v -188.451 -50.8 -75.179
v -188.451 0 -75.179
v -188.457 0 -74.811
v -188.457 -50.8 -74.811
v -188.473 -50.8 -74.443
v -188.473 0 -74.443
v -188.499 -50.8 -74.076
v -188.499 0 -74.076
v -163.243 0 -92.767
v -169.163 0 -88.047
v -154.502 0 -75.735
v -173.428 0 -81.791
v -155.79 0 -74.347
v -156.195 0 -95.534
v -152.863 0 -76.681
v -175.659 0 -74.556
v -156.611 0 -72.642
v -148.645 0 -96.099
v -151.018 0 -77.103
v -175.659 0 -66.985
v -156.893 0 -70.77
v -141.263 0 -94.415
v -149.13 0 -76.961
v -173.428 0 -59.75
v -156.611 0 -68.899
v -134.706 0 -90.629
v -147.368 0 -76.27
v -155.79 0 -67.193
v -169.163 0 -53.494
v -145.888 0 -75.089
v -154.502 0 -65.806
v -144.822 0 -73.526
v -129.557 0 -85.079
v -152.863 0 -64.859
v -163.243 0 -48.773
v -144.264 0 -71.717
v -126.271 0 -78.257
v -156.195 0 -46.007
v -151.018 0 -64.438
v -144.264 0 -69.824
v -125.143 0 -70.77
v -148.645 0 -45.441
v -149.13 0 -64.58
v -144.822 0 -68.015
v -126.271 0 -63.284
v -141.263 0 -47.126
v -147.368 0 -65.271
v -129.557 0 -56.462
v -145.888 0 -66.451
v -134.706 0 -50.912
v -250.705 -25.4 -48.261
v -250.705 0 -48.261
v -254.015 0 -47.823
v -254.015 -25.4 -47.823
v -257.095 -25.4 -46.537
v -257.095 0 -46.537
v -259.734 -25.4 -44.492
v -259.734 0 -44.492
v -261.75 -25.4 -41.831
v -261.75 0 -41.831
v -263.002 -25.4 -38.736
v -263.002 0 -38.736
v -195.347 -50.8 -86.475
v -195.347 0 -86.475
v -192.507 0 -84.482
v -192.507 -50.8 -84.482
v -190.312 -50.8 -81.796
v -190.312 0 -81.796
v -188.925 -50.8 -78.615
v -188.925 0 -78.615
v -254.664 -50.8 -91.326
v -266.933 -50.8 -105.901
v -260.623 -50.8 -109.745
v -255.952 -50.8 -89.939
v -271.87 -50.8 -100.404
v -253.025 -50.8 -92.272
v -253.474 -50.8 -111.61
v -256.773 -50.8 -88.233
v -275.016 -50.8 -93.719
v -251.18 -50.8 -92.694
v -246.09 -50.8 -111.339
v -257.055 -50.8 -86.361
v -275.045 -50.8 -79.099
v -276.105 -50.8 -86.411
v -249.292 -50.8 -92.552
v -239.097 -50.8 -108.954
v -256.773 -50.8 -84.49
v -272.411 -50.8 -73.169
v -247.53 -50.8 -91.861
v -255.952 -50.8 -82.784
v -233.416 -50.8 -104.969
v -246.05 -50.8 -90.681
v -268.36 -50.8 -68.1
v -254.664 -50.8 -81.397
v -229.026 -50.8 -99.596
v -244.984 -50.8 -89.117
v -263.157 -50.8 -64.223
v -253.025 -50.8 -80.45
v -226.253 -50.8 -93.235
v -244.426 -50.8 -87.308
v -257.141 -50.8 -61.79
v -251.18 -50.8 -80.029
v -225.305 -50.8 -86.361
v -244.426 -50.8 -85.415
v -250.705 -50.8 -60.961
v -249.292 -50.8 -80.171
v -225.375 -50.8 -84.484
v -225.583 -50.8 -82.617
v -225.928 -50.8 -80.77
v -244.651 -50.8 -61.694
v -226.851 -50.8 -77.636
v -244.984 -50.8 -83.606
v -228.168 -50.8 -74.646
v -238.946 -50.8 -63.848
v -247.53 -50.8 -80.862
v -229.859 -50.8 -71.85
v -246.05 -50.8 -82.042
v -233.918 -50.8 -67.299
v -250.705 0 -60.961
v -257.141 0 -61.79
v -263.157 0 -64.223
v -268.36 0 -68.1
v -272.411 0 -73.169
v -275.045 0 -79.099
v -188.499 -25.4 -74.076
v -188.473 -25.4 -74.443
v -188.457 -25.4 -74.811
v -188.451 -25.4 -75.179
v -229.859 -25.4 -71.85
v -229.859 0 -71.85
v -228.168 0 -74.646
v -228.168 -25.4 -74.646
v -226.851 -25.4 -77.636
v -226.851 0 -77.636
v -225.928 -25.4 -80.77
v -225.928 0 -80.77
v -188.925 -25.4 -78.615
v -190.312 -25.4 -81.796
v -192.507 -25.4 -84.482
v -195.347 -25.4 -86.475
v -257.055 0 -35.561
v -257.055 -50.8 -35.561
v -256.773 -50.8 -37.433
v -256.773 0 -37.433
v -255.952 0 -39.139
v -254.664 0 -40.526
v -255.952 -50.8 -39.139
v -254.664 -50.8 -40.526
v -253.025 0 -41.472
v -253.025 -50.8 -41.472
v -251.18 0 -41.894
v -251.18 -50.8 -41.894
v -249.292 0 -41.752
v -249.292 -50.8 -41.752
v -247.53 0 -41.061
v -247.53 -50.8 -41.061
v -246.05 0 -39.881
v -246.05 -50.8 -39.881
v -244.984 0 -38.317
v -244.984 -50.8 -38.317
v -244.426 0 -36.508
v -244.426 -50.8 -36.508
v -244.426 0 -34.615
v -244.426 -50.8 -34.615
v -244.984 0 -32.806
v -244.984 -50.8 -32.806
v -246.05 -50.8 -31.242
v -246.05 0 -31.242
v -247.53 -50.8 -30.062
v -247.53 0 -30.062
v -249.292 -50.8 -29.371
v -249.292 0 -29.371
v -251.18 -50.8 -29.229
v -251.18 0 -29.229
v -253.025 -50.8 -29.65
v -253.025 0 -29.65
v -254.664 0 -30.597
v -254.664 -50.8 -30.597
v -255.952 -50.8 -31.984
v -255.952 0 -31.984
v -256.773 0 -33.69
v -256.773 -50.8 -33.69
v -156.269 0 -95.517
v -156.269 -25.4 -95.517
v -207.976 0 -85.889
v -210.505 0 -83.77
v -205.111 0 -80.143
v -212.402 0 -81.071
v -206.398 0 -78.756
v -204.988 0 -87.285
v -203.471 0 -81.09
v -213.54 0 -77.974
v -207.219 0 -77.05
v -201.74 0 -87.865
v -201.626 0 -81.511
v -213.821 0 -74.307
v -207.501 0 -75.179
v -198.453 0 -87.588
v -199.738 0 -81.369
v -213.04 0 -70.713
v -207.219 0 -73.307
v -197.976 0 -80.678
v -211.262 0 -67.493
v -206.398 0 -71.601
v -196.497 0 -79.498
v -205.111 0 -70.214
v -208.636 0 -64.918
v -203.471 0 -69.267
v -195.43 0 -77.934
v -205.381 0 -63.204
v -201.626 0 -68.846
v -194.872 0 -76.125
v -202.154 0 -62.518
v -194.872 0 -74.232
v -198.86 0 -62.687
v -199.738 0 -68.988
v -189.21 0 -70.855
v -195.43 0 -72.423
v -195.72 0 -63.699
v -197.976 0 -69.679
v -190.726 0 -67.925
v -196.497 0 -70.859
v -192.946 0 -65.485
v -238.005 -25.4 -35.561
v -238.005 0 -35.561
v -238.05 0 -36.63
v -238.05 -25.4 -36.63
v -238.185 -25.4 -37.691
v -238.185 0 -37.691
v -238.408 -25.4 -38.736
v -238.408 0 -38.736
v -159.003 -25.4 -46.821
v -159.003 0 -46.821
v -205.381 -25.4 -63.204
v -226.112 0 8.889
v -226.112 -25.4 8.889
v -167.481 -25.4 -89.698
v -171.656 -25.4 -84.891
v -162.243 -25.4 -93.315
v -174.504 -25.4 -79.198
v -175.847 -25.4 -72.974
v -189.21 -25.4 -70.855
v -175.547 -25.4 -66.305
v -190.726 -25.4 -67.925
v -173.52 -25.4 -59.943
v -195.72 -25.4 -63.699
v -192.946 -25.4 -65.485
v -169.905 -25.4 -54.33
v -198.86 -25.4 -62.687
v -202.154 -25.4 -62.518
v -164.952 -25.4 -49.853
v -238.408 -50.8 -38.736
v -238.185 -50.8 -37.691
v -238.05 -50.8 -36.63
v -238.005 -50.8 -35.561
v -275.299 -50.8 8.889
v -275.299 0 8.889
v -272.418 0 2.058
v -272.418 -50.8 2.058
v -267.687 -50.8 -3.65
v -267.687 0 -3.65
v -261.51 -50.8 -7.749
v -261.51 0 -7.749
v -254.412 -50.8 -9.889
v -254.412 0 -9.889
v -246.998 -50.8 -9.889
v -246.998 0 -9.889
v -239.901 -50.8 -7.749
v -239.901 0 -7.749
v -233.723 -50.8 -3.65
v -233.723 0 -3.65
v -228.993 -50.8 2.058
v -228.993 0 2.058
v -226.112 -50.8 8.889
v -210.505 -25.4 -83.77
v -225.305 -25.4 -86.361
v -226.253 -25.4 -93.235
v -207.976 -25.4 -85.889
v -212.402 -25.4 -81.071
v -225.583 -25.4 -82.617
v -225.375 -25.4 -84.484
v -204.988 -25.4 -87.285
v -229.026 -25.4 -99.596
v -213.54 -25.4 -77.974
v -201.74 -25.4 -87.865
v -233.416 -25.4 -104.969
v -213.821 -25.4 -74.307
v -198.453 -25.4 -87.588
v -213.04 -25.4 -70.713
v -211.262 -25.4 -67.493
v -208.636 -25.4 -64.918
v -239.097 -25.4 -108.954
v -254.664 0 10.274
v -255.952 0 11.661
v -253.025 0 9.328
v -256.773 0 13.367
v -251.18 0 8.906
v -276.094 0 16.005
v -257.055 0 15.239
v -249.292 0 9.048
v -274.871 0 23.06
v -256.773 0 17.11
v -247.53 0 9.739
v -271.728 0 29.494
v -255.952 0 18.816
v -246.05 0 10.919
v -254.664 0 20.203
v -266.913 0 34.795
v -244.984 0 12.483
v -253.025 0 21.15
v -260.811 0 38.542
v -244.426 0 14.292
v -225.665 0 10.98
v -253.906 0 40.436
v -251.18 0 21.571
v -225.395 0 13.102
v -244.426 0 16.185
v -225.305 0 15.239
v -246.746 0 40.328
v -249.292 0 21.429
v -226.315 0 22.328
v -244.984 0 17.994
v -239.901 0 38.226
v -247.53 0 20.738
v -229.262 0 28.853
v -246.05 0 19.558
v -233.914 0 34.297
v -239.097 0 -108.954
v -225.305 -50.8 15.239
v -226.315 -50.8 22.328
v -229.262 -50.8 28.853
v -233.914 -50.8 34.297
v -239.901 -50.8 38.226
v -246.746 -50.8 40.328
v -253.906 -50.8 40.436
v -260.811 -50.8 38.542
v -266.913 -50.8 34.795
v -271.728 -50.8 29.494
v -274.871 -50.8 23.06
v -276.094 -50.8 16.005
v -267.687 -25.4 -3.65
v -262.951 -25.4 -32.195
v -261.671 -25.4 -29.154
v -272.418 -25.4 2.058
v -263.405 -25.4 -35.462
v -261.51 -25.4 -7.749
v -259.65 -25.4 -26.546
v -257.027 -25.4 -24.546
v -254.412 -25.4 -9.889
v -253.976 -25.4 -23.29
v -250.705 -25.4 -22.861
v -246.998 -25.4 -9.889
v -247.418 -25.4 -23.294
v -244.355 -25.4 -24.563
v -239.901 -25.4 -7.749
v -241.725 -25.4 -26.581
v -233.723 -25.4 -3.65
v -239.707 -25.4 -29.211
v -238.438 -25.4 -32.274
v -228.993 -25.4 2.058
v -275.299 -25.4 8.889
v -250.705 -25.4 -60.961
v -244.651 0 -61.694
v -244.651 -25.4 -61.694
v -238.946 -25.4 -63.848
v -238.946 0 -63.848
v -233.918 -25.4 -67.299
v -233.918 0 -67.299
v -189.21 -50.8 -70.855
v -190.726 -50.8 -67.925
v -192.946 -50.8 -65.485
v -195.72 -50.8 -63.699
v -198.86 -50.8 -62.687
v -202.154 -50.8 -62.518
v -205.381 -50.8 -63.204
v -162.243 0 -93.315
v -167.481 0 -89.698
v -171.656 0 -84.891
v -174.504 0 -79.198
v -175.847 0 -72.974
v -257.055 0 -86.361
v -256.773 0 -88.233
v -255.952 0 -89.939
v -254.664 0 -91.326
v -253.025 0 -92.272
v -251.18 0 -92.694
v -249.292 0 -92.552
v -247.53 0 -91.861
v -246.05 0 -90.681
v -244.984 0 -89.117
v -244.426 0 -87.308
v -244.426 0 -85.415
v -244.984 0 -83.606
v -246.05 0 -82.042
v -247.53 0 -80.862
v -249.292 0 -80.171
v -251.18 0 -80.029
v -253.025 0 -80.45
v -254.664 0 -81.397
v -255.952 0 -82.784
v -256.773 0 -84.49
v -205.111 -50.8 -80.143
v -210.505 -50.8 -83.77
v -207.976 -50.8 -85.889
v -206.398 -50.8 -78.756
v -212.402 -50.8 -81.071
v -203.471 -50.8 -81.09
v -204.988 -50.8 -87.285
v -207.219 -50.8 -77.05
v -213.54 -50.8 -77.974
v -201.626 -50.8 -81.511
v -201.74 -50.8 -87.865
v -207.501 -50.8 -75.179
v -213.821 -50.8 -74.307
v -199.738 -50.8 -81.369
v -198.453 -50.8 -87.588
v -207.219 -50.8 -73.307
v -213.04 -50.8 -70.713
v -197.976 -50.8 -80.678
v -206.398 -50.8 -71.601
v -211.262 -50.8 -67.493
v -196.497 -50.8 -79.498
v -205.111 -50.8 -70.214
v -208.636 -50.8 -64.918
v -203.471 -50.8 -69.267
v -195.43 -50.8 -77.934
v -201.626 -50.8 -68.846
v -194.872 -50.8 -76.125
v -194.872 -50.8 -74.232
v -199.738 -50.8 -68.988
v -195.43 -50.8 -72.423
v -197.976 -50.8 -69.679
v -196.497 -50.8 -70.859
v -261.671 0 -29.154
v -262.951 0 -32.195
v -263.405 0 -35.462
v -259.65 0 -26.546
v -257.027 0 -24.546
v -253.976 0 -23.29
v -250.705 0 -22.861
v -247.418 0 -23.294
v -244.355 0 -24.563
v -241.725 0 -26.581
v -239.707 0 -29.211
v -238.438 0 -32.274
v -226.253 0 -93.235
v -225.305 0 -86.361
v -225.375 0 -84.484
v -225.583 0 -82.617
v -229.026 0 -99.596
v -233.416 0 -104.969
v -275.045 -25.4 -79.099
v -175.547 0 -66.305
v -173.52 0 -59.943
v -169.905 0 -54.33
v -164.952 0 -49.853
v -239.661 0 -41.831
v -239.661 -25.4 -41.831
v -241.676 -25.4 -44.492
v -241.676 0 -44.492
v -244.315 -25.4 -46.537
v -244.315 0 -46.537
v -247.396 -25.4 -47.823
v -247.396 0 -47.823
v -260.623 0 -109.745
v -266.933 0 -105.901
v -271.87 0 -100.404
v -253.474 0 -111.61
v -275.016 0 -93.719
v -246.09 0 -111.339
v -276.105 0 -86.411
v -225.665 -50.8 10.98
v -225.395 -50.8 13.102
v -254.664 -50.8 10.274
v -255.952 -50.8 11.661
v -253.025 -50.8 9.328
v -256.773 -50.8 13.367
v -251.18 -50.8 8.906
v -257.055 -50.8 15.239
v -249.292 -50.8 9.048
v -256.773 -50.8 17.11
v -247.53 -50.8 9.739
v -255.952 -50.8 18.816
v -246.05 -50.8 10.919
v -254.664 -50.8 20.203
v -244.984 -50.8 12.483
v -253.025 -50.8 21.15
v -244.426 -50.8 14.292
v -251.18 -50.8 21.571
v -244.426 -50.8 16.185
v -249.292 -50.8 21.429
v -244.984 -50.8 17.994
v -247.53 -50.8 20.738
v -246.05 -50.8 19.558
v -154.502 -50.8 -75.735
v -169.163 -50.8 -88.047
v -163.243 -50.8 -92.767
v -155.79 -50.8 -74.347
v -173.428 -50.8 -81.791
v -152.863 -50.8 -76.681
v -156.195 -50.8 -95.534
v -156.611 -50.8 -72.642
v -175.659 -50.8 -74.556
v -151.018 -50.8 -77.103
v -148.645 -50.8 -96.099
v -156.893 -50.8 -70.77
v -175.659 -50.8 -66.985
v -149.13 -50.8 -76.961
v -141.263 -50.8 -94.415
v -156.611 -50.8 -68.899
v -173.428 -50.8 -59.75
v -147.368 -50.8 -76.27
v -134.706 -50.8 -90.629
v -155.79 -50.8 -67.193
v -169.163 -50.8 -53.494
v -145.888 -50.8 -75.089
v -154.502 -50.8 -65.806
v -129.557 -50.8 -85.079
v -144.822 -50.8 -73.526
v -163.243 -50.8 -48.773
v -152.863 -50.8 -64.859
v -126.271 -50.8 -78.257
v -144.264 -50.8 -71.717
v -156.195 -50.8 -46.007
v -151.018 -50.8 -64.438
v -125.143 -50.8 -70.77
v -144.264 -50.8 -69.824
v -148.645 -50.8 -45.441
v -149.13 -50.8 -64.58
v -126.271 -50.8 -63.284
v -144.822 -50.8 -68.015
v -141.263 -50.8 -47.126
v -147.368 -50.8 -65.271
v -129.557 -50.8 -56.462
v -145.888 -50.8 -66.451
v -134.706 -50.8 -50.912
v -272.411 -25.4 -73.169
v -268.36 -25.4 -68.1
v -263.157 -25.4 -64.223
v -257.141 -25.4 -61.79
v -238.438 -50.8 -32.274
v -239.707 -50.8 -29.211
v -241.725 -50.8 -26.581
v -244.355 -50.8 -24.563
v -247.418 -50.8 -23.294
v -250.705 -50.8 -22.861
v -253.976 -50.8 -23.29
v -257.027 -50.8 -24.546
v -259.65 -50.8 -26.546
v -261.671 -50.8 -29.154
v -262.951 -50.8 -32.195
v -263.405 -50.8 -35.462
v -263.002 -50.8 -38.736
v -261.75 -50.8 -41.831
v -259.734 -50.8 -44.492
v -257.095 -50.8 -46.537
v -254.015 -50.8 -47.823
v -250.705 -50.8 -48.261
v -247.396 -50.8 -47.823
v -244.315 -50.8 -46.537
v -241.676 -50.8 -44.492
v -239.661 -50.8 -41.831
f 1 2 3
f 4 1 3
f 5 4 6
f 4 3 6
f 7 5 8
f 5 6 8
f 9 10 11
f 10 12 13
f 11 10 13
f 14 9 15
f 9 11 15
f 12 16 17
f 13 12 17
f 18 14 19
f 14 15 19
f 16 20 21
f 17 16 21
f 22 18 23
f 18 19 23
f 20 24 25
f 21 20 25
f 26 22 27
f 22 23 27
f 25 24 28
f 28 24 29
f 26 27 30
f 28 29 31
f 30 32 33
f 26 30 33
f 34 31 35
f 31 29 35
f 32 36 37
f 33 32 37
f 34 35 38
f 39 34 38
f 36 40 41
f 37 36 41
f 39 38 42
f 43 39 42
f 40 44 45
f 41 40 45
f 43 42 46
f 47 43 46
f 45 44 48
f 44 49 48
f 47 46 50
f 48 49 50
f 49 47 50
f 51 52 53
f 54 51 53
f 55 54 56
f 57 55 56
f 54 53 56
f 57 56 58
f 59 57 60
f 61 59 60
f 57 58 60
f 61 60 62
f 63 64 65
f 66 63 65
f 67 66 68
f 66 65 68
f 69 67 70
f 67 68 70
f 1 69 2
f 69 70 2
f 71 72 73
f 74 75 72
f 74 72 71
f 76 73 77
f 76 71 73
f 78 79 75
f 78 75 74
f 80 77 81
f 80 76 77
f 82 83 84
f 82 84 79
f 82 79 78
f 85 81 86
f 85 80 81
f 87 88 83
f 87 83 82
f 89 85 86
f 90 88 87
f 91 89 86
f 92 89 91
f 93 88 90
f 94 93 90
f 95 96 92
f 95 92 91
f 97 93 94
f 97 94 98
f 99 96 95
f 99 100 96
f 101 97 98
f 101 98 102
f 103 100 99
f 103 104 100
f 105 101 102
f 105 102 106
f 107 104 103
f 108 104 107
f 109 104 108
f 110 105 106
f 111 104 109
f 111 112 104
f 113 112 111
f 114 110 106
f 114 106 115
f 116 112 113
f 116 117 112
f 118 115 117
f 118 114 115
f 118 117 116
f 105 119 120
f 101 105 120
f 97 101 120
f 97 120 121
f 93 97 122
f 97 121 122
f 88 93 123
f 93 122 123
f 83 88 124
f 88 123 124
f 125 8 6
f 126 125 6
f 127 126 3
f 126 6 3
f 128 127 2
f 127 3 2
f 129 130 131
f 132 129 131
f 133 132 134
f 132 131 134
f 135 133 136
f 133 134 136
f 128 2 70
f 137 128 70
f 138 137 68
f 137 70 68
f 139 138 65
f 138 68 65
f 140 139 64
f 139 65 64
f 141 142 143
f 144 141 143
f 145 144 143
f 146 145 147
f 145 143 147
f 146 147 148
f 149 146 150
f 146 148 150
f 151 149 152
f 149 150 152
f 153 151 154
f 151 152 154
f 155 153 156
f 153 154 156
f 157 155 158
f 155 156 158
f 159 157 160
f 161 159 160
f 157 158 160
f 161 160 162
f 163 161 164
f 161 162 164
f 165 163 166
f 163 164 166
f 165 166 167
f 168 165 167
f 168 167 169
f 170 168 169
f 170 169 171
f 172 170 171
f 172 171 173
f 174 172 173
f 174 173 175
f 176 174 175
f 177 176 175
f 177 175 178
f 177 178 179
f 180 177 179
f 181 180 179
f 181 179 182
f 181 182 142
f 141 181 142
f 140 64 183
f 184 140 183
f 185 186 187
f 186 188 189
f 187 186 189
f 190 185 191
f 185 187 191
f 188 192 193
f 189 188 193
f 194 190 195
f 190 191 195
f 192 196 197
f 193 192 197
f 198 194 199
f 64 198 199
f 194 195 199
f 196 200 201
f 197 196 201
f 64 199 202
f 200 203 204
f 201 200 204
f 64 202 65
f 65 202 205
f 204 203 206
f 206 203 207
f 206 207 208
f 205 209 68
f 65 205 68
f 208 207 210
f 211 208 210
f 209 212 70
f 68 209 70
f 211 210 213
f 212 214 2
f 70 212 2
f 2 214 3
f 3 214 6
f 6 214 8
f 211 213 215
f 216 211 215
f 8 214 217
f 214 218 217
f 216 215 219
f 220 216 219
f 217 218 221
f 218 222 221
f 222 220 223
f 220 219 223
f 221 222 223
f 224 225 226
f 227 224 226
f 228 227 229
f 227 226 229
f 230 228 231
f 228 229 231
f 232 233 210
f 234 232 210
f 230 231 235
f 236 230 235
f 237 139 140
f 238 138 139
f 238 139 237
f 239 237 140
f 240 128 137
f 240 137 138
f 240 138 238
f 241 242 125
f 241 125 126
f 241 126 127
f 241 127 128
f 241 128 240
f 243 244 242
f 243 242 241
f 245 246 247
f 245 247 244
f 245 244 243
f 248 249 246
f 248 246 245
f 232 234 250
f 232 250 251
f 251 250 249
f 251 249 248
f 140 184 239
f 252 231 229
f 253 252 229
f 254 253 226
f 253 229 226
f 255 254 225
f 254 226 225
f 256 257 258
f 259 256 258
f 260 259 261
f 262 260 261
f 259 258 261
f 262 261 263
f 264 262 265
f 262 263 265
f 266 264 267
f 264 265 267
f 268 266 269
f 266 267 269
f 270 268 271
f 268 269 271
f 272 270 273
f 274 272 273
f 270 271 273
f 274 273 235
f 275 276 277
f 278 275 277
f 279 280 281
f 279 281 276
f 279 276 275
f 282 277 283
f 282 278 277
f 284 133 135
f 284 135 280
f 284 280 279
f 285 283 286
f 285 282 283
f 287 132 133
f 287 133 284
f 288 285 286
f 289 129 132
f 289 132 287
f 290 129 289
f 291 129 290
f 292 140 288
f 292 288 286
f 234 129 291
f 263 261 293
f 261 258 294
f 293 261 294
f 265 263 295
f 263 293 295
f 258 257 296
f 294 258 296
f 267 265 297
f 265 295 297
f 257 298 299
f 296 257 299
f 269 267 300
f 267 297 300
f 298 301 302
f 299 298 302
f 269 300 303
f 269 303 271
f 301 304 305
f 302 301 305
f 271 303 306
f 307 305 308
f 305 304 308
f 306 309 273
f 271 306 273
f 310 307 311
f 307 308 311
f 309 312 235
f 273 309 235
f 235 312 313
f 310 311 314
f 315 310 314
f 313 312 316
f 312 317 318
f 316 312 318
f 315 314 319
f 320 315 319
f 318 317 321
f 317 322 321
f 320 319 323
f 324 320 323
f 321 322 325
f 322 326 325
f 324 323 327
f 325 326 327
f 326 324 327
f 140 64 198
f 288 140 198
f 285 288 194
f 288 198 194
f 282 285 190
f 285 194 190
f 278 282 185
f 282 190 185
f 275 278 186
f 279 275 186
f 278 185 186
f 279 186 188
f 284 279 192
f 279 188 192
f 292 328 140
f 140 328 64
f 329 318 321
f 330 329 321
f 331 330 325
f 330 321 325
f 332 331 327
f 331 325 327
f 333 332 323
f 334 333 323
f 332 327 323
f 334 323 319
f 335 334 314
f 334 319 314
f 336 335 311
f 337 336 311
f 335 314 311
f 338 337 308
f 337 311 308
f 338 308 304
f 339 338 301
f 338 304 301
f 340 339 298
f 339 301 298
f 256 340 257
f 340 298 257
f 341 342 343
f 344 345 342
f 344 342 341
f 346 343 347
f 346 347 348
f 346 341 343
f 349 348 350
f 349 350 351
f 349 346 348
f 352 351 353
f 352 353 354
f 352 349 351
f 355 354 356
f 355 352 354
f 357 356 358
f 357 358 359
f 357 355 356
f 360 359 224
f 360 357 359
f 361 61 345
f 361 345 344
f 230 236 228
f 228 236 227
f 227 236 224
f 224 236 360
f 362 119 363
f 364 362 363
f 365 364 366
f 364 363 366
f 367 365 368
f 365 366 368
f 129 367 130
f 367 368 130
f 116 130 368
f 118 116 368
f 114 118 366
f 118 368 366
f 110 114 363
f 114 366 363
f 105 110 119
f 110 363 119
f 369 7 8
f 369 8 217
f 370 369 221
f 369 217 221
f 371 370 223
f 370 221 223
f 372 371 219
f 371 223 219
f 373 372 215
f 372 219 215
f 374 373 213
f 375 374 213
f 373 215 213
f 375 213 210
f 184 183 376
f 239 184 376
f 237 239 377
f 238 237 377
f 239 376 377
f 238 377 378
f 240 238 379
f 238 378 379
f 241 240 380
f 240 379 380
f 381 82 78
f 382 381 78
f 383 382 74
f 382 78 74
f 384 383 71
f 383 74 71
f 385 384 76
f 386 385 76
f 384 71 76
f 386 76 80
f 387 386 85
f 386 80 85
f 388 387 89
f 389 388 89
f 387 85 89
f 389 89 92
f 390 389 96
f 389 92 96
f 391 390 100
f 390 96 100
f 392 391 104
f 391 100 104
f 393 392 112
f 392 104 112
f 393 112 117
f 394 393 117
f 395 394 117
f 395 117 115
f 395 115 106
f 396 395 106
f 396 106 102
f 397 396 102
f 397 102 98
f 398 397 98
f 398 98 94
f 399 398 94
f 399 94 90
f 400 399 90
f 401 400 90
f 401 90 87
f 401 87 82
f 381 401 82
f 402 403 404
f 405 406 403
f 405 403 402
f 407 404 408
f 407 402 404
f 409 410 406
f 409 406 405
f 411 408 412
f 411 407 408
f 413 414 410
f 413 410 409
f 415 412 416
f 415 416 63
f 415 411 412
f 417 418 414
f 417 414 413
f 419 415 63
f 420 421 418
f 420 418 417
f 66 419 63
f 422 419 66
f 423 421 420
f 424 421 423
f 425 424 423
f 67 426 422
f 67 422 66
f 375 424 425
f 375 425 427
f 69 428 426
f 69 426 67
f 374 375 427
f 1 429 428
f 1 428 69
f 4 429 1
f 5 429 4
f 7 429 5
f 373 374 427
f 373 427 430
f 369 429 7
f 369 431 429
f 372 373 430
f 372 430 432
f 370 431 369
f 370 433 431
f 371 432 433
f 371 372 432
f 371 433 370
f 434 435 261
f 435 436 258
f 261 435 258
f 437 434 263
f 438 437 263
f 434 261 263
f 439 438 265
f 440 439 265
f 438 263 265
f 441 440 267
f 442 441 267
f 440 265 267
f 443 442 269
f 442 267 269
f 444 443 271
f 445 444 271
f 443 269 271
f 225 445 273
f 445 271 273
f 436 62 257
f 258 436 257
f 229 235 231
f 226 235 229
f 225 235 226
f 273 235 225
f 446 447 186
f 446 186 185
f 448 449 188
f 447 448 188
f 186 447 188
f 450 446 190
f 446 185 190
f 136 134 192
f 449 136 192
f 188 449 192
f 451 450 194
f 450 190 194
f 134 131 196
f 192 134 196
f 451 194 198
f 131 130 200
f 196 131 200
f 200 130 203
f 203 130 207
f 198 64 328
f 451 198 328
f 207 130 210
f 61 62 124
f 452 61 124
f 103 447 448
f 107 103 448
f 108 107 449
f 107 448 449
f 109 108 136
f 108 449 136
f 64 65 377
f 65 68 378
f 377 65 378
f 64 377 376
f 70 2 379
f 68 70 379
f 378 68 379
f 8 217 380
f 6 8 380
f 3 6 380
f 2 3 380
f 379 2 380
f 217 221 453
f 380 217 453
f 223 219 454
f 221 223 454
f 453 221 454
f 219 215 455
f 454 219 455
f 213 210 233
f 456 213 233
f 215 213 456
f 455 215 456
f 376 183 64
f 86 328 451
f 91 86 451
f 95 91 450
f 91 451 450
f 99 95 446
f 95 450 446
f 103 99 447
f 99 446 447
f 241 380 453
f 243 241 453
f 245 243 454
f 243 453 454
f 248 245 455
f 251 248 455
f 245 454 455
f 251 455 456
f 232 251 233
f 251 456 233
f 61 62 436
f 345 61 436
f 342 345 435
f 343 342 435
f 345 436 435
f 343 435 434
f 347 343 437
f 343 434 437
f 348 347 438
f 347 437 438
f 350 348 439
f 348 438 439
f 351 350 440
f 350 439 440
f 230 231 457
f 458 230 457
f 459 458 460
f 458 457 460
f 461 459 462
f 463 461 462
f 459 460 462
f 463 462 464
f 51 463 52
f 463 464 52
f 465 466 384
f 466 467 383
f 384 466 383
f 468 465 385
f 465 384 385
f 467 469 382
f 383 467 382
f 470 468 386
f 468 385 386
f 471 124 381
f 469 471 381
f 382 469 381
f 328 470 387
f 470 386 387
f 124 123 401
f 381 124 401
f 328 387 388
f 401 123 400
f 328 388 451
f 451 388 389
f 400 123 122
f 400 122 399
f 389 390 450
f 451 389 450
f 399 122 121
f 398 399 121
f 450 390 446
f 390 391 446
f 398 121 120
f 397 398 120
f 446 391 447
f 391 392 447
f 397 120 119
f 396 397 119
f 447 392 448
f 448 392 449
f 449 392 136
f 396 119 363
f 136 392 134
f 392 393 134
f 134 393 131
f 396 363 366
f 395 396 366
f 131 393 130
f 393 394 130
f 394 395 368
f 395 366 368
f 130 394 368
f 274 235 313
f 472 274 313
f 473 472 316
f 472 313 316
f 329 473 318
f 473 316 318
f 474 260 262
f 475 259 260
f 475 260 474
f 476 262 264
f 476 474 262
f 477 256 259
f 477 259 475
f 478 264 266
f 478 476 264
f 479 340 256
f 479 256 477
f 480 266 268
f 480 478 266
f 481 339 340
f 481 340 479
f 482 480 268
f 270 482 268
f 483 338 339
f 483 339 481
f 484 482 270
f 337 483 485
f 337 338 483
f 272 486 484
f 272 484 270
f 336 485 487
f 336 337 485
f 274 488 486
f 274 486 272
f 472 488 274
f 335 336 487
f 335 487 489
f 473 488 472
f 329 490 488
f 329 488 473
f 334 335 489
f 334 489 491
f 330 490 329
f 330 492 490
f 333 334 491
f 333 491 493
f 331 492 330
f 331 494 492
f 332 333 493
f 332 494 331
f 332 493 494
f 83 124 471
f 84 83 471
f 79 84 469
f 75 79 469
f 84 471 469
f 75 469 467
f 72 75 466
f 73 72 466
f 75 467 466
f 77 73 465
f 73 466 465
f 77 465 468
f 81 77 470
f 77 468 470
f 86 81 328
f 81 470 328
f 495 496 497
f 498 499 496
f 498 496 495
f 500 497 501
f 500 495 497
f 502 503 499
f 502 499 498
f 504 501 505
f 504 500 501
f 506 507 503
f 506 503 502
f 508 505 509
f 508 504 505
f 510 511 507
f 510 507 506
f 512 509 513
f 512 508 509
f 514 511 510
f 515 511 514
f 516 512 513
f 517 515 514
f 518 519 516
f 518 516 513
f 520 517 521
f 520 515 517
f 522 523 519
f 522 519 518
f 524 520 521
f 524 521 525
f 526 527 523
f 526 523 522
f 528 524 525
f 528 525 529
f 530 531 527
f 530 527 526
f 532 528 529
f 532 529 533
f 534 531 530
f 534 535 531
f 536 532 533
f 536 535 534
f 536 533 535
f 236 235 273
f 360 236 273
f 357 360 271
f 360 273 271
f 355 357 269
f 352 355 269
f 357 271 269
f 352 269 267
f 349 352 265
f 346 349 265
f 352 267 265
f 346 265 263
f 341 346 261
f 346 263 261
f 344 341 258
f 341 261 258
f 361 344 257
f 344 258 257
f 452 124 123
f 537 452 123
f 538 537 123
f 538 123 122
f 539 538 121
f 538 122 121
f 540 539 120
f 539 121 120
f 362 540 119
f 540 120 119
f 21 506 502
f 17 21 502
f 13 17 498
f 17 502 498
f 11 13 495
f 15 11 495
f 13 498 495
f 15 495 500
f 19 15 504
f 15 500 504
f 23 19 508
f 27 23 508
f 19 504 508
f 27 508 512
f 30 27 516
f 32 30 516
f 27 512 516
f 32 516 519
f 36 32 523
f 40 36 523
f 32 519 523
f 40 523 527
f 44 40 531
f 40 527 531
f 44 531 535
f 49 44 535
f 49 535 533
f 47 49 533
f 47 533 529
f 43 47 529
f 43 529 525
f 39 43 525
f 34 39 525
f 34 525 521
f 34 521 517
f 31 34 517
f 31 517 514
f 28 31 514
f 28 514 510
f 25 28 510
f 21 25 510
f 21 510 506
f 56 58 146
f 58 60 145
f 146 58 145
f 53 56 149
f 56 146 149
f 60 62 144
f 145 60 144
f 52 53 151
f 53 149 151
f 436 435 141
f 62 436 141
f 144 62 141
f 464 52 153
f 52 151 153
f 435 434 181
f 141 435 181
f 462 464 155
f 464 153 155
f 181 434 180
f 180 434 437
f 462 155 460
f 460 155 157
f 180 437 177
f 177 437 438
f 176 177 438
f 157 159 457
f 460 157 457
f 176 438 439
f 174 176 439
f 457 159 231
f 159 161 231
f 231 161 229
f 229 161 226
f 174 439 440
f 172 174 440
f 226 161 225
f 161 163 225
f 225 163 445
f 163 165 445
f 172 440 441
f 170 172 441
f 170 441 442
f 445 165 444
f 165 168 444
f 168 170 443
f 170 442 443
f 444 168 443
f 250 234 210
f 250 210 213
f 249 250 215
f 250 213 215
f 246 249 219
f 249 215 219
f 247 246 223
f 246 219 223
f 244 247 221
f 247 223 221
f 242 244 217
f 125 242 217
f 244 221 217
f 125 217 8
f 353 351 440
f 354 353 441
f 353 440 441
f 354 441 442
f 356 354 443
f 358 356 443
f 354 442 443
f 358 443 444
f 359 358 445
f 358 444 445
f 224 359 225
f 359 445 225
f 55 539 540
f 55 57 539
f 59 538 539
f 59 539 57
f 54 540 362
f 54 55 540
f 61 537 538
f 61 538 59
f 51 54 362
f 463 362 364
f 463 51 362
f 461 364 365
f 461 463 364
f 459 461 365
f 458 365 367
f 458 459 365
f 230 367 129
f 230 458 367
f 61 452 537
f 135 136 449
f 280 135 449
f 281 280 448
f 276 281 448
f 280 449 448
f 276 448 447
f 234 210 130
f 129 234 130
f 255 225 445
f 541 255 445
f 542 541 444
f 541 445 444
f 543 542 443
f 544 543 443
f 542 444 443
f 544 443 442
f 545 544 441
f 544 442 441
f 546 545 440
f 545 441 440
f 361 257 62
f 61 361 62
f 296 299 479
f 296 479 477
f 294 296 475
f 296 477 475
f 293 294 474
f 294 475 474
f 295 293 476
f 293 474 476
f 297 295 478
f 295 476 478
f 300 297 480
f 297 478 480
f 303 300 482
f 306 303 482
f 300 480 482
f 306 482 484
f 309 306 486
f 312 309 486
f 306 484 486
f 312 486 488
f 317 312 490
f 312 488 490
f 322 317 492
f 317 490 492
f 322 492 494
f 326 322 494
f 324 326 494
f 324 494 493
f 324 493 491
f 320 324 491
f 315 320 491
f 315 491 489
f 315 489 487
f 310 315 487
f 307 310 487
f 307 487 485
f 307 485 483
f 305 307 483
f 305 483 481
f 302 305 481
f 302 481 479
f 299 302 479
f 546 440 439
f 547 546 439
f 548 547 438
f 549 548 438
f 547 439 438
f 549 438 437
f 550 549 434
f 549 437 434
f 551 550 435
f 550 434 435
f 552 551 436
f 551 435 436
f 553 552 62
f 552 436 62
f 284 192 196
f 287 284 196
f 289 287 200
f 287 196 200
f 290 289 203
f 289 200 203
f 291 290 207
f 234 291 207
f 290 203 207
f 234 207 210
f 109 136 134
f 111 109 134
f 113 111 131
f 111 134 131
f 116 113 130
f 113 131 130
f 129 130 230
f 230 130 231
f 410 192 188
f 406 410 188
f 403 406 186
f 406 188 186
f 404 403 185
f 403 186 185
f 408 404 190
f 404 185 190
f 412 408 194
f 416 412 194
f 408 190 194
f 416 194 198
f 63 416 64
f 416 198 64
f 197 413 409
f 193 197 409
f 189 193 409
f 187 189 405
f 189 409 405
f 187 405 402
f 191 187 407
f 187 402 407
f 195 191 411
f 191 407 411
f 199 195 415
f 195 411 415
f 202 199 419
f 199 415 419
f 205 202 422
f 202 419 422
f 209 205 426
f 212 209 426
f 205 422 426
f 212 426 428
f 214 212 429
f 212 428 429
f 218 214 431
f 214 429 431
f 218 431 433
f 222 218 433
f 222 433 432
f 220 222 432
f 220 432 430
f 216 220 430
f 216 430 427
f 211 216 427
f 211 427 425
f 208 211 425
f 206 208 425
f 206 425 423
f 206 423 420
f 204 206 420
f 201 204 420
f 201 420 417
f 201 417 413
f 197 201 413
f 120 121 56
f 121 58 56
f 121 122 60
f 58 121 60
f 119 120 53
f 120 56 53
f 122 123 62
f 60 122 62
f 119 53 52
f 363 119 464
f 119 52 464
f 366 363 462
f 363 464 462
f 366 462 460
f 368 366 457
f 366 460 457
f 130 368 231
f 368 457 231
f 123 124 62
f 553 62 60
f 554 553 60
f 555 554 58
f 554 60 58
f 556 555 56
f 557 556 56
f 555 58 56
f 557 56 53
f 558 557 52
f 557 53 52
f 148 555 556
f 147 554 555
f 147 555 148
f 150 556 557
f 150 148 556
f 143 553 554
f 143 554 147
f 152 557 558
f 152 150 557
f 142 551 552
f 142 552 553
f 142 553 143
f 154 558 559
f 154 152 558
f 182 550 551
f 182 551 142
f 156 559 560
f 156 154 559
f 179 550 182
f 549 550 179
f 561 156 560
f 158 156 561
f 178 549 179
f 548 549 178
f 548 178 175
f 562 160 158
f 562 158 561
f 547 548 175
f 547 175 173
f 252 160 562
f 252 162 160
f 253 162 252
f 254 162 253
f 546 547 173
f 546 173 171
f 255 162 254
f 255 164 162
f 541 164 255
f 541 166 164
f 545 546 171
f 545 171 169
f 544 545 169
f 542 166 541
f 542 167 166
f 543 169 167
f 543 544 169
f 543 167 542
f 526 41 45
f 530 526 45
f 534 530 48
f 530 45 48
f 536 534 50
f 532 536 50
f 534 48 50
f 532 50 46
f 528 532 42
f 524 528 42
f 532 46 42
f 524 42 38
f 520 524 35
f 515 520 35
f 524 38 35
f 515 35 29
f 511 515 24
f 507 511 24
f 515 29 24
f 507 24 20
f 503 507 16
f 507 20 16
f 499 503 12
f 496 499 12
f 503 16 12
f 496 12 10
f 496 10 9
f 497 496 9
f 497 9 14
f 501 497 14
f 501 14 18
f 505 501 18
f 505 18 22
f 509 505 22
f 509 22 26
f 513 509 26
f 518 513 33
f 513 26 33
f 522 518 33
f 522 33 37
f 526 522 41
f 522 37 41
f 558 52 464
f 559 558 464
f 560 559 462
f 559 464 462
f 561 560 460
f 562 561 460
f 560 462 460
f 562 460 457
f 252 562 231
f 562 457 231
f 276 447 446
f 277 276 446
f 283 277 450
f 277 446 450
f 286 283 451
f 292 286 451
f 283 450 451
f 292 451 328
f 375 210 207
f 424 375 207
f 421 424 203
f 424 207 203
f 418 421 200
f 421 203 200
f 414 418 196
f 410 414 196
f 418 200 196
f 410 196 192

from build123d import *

# Parameters (mm, degrees)
F1_DEPTH = 50.8
F2_DEPTH = 25.4
F3_D     = 6.35
F3_2_D   = 6.35
F3_3_D   = 6.35
F3_4_D   = 6.35
F3_5_D   = 6.35
F4_D     = 12.7
F4_2_D   = 12.7
F4_3_D   = 12.7
F4_4_D   = 12.7
F4_5_D   = 12.7


with BuildPart() as f1:
    # F0 (on Front) → F1 (new body)
    with BuildSketch(Plane.XZ):
        with BuildLine():
            ThreePointArc((-275.2986628223, 8.8885812562), (-266.2594784405, -4.8418818859), (-250.7052185738, -10.1614187438))
            ThreePointArc((-250.7052185738, -10.1614187438), (-235.1509587072, -4.8418818859), (-226.1117743254, 8.8885812562))
            ThreePointArc((-226.1117743254, 8.8885812562), (-225.5076642886, 12.0380722271), (-225.3052185738, 15.2385812562))
            ThreePointArc((-225.3052185738, 15.2385812562), (-253.9057276029, 40.4361355414), (-275.2986628223, 8.8885812562))
        make_face()
    extrude(amount=F1_DEPTH)

    # F3 (through all)
    with Locations(Plane(origin=(0, 0, 0), x_dir=(1, 0, 0), z_dir=(0, 1, 0))):
        with Locations((-250.7052185738, -15.2385812562), (-250.7052185738, 35.5614187438), (-250.7052185738, 86.3614187438), (-201.151381854, 75.1785181209), (-150.5429993109, 70.7703874091)):
            Hole(F3_D / 2)

    # F4 (through all)
    with Locations(Plane(origin=(0, 0, 0), x_dir=(1, 0, 0), z_dir=(0, 1, 0))):
        with Locations((-250.7052185738, -15.2385812562), (-250.7052185738, 35.5614187438), (-250.7052185738, 86.3614187438), (-201.151381854, 75.1785181209), (-150.5429993109, 70.7703874091)):
            Hole(F4_D / 2)


with BuildPart() as f1b:
    # F0 (on Front) → F1, piece 2 (new body)
    with BuildSketch(Plane.XZ):
        with BuildLine():
            ThreePointArc((-238.0052185738, -35.5614187438), (-241.7249624528, -26.5811626228), (-250.7052185738, -22.8614187438))
            Line((-250.7052185738, -22.8614187438), (-250.7052185738, -35.5614187438))
            Line((-250.7052185738, -35.5614187438), (-250.7052185738, -48.2614187438))
            ThreePointArc((-250.7052185738, -48.2614187438), (-242.9280886405, -45.6016503149), (-238.4084964496, -38.7364187438))
            ThreePointArc((-238.4084964496, -38.7364187438), (-238.1064414312, -37.1616732584), (-238.0052185738, -35.5614187438))
        make_face()
        with BuildLine():
            Line((-250.7052185738, -35.5614187438), (-250.7052185738, -22.8614187438))
            ThreePointArc((-250.7052185738, -22.8614187438), (-260.7454501449, -27.7842888105), (-263.001940698, -38.7364187438))
            ThreePointArc((-263.001940698, -38.7364187438), (-258.4823485072, -45.6016503149), (-250.7052185738, -48.2614187438))
            Line((-250.7052185738, -48.2614187438), (-250.7052185738, -35.5614187438))
        make_face()
    extrude(amount=F1_DEPTH)

    # F3#2 (through all)
    with Locations(Plane(origin=(0, 0, 0), x_dir=(1, 0, 0), z_dir=(0, 1, 0))):
        with Locations((-250.7052185738, -15.2385812562), (-250.7052185738, 35.5614187438), (-250.7052185738, 86.3614187438), (-201.151381854, 75.1785181209), (-150.5429993109, 70.7703874091)):
            Hole(F3_2_D / 2)

    # F4#2 (through all)
    with Locations(Plane(origin=(0, 0, 0), x_dir=(1, 0, 0), z_dir=(0, 1, 0))):
        with Locations((-250.7052185738, -15.2385812562), (-250.7052185738, 35.5614187438), (-250.7052185738, 86.3614187438), (-201.151381854, 75.1785181209), (-150.5429993109, 70.7703874091)):
            Hole(F4_2_D / 2)


with BuildPart() as f1c:
    # F0 (on Front) → F1, piece 3 (new body)
    with BuildSketch(Plane.XZ):
        with BuildLine():
            ThreePointArc((-250.7052185738, -60.9614187438), (-265.8825125384, -65.9945400455), (-275.0449118924, -79.0992338688))
            ThreePointArc((-275.0449118924, -79.0992338688), (-266.9331432174, -105.901491972), (-239.0970904995, -108.9537042105))
            ThreePointArc((-239.0970904995, -108.9537042105), (-229.0256607706, -99.5960994523), (-225.3052185738, -86.3614187438))
            ThreePointArc((-225.3052185738, -86.3614187438), (-225.4614695818, -83.548388913), (-225.9283002139, -80.7699684324))
            Line((-225.9283002139, -80.7699684324), (-250.7052185738, -86.3614187438))
            Line((-250.7052185738, -86.3614187438), (-250.7052185738, -60.9614187438))
        make_face()
        with BuildLine():
            ThreePointArc((-225.9283002139, -80.7699684324), (-227.4615465931, -76.1197532128), (-229.8585710724, -71.850137341))
            ThreePointArc((-229.8585710724, -71.850137341), (-238.945680905, -63.847572475), (-250.7052185738, -60.9614187438))
            Line((-250.7052185738, -60.9614187438), (-250.7052185738, -86.3614187438))
            Line((-250.7052185738, -86.3614187438), (-225.9283002139, -80.7699684324))
        make_face()
    extrude(amount=F1_DEPTH)

    # F3#3 (through all)
    with Locations(Plane(origin=(0, 0, 0), x_dir=(1, 0, 0), z_dir=(0, 1, 0))):
        with Locations((-250.7052185738, -15.2385812562), (-250.7052185738, 35.5614187438), (-250.7052185738, 86.3614187438), (-201.151381854, 75.1785181209), (-150.5429993109, 70.7703874091)):
            Hole(F3_3_D / 2)

    # F4#3 (through all)
    with Locations(Plane(origin=(0, 0, 0), x_dir=(1, 0, 0), z_dir=(0, 1, 0))):
        with Locations((-250.7052185738, -15.2385812562), (-250.7052185738, 35.5614187438), (-250.7052185738, 86.3614187438), (-201.151381854, 75.1785181209), (-150.5429993109, 70.7703874091)):
            Hole(F4_3_D / 2)


with BuildPart() as f1d:
    # F0 (on Front) → F1, piece 4 (new body)
    with BuildSketch(Plane.XZ):
        with BuildLine():
            ThreePointArc((-188.4992862182, -74.076485443), (-194.2748205624, -64.5013038399), (-205.3814443151, -63.2036873674))
            ThreePointArc((-205.3814443151, -63.2036873674), (-212.2683124488, -69.0381717016), (-213.5398410339, -77.9742432766))
            Line((-213.5398410339, -77.9742432766), (-201.151381854, -75.1785181209))
            Line((-201.151381854, -75.1785181209), (-188.4992862182, -74.076485443))
        make_face()
        with BuildLine():
            ThreePointArc((-213.5398410339, -77.9742432766), (-206.5275179755, -86.6844800712), (-195.3473178168, -86.4746608543))
            ThreePointArc((-195.3473178168, -86.4746608543), (-190.3116029524, -81.7958584752), (-188.451381854, -75.1785181209))
            ThreePointArc((-188.451381854, -75.1785181209), (-188.4633635971, -74.6269814378), (-188.4992862182, -74.076485443))
            Line((-188.4992862182, -74.076485443), (-201.151381854, -75.1785181209))
            Line((-201.151381854, -75.1785181209), (-213.5398410339, -77.9742432766))
        make_face()
    extrude(amount=F1_DEPTH)

    # F3#4 (through all)
    with Locations(Plane(origin=(0, 0, 0), x_dir=(1, 0, 0), z_dir=(0, 1, 0))):
        with Locations((-250.7052185738, -15.2385812562), (-250.7052185738, 35.5614187438), (-250.7052185738, 86.3614187438), (-201.151381854, 75.1785181209), (-150.5429993109, 70.7703874091)):
            Hole(F3_4_D / 2)

    # F4#4 (through all)
    with Locations(Plane(origin=(0, 0, 0), x_dir=(1, 0, 0), z_dir=(0, 1, 0))):
        with Locations((-250.7052185738, -15.2385812562), (-250.7052185738, 35.5614187438), (-250.7052185738, 86.3614187438), (-201.151381854, 75.1785181209), (-150.5429993109, 70.7703874091)):
            Hole(F4_4_D / 2)


with BuildPart() as f1e:
    # F0 (on Front) → F1, piece 5 (new body)
    with BuildSketch(Plane.XZ):
        with BuildLine():
            ThreePointArc((-125.1429993109, -70.7703874091), (-135.8754700886, -50.0333773423), (-159.0031242331, -46.8207259021))
            ThreePointArc((-159.0031242331, -46.8207259021), (-171.897427873, -57.017264826), (-175.8471905824, -72.974452765))
            ThreePointArc((-175.8471905824, -72.974452765), (-169.7198507425, -87.4259681306), (-156.268752864, -95.5166143185))
            ThreePointArc((-156.268752864, -95.5166143185), (-134.7359461423, -90.6524665289), (-125.1429993109, -70.7703874091))
        make_face()
    extrude(amount=F1_DEPTH)

    # F3#5 (through all)
    with Locations(Plane(origin=(0, 0, 0), x_dir=(1, 0, 0), z_dir=(0, 1, 0))):
        with Locations((-250.7052185738, -15.2385812562), (-250.7052185738, 35.5614187438), (-250.7052185738, 86.3614187438), (-201.151381854, 75.1785181209), (-150.5429993109, 70.7703874091)):
            Hole(F3_5_D / 2)

    # F4#5 (through all)
    with Locations(Plane(origin=(0, 0, 0), x_dir=(1, 0, 0), z_dir=(0, 1, 0))):
        with Locations((-250.7052185738, -15.2385812562), (-250.7052185738, 35.5614187438), (-250.7052185738, 86.3614187438), (-201.151381854, 75.1785181209), (-150.5429993109, 70.7703874091)):
            Hole(F4_5_D / 2)


with BuildPart() as f2:
    # F0 (on Front) → F2 (new body)
    with BuildSketch(Plane.XZ):
        with BuildLine():
            Line((-250.7052185738, -22.8614187438), (-250.7052185738, -10.1614187438))
            ThreePointArc((-250.7052185738, -10.1614187438), (-266.2594784405, -4.8418818859), (-275.2986628223, 8.8885812562))
            Line((-275.2986628223, 8.8885812562), (-263.001940698, -38.7364187438))
            ThreePointArc((-263.001940698, -38.7364187438), (-260.7454501449, -27.7842888105), (-250.7052185738, -22.8614187438))
        make_face()
        with BuildLine():
            ThreePointArc((-226.1117743254, 8.8885812562), (-235.1509587072, -4.8418818859), (-250.7052185738, -10.1614187438))
            Line((-250.7052185738, -10.1614187438), (-250.7052185738, -22.8614187438))
            ThreePointArc((-250.7052185738, -22.8614187438), (-241.7249624528, -26.5811626228), (-238.0052185738, -35.5614187438))
            ThreePointArc((-238.0052185738, -35.5614187438), (-238.1064414312, -37.1616732584), (-238.4084964496, -38.7364187438))
            Line((-238.4084964496, -38.7364187438), (-226.1117743254, 8.8885812562))
        make_face()
    extrude(amount=F2_DEPTH)


with BuildPart() as f2b:
    # F0 (on Front) → F2, piece 2 (new body)
    with BuildSketch(Plane.XZ):
        with BuildLine():
            Line((-229.8585710724, -71.850137341), (-238.4084964496, -38.7364187438))
            ThreePointArc((-238.4084964496, -38.7364187438), (-242.9280886405, -45.6016503149), (-250.7052185738, -48.2614187438))
            Line((-250.7052185738, -48.2614187438), (-250.7052185738, -60.9614187438))
            ThreePointArc((-250.7052185738, -60.9614187438), (-238.945680905, -63.847572475), (-229.8585710724, -71.850137341))
        make_face()
        with BuildLine():
            ThreePointArc((-250.7052185738, -48.2614187438), (-258.4823485072, -45.6016503149), (-263.001940698, -38.7364187438))
            Line((-263.001940698, -38.7364187438), (-275.0449118924, -79.0992338688))
            ThreePointArc((-275.0449118924, -79.0992338688), (-265.8825125384, -65.9945400455), (-250.7052185738, -60.9614187438))
            Line((-250.7052185738, -60.9614187438), (-250.7052185738, -48.2614187438))
        make_face()
    extrude(amount=F2_DEPTH)


with BuildPart() as f2c:
    # F0 (on Front) → F2, piece 3 (new body)
    with BuildSketch(Plane.XZ):
        with BuildLine():
            Line((-159.0031242331, -46.8207259021), (-205.3814443151, -63.2036873674))
            ThreePointArc((-205.3814443151, -63.2036873674), (-194.2748205624, -64.5013038399), (-188.4992862182, -74.076485443))
            Line((-188.4992862182, -74.076485443), (-175.8471905824, -72.974452765))
            ThreePointArc((-175.8471905824, -72.974452765), (-171.897427873, -57.017264826), (-159.0031242331, -46.8207259021))
        make_face()
        with BuildLine():
            ThreePointArc((-188.451381854, -75.1785181209), (-190.3116029524, -81.7958584752), (-195.3473178168, -86.4746608543))
            Line((-195.3473178168, -86.4746608543), (-156.268752864, -95.5166143185))
            ThreePointArc((-156.268752864, -95.5166143185), (-169.7198507425, -87.4259681306), (-175.8471905824, -72.974452765))
            Line((-175.8471905824, -72.974452765), (-188.4992862182, -74.076485443))
            ThreePointArc((-188.4992862182, -74.076485443), (-188.4633635971, -74.6269814378), (-188.451381854, -75.1785181209))
        make_face()
    extrude(amount=F2_DEPTH)


with BuildPart() as f2d:
    # F0 (on Front) → F2, piece 4 (new body)
    with BuildSketch(Plane.XZ):
        with BuildLine():
            ThreePointArc((-225.3052185738, -86.3614187438), (-229.0256607706, -99.5960994523), (-239.0970904995, -108.9537042105))
            Line((-239.0970904995, -108.9537042105), (-195.3473178168, -86.4746608543))
            ThreePointArc((-195.3473178168, -86.4746608543), (-206.5275179755, -86.6844800712), (-213.5398410339, -77.9742432766))
            Line((-213.5398410339, -77.9742432766), (-225.9283002139, -80.7699684324))
            ThreePointArc((-225.9283002139, -80.7699684324), (-225.4614695818, -83.548388913), (-225.3052185738, -86.3614187438))
        make_face()
        with BuildLine():
            Line((-205.3814443151, -63.2036873674), (-229.8585710724, -71.850137341))
            ThreePointArc((-229.8585710724, -71.850137341), (-227.4615465931, -76.1197532128), (-225.9283002139, -80.7699684324))
            Line((-225.9283002139, -80.7699684324), (-213.5398410339, -77.9742432766))
            ThreePointArc((-213.5398410339, -77.9742432766), (-212.2683124488, -69.0381717016), (-205.3814443151, -63.2036873674))
        make_face()
    extrude(amount=F2_DEPTH)


solid = Compound([f1.part, f1b.part, f1c.part, f1d.part, f1e.part, f2.part, f2b.part, f2c.part, f2d.part])
